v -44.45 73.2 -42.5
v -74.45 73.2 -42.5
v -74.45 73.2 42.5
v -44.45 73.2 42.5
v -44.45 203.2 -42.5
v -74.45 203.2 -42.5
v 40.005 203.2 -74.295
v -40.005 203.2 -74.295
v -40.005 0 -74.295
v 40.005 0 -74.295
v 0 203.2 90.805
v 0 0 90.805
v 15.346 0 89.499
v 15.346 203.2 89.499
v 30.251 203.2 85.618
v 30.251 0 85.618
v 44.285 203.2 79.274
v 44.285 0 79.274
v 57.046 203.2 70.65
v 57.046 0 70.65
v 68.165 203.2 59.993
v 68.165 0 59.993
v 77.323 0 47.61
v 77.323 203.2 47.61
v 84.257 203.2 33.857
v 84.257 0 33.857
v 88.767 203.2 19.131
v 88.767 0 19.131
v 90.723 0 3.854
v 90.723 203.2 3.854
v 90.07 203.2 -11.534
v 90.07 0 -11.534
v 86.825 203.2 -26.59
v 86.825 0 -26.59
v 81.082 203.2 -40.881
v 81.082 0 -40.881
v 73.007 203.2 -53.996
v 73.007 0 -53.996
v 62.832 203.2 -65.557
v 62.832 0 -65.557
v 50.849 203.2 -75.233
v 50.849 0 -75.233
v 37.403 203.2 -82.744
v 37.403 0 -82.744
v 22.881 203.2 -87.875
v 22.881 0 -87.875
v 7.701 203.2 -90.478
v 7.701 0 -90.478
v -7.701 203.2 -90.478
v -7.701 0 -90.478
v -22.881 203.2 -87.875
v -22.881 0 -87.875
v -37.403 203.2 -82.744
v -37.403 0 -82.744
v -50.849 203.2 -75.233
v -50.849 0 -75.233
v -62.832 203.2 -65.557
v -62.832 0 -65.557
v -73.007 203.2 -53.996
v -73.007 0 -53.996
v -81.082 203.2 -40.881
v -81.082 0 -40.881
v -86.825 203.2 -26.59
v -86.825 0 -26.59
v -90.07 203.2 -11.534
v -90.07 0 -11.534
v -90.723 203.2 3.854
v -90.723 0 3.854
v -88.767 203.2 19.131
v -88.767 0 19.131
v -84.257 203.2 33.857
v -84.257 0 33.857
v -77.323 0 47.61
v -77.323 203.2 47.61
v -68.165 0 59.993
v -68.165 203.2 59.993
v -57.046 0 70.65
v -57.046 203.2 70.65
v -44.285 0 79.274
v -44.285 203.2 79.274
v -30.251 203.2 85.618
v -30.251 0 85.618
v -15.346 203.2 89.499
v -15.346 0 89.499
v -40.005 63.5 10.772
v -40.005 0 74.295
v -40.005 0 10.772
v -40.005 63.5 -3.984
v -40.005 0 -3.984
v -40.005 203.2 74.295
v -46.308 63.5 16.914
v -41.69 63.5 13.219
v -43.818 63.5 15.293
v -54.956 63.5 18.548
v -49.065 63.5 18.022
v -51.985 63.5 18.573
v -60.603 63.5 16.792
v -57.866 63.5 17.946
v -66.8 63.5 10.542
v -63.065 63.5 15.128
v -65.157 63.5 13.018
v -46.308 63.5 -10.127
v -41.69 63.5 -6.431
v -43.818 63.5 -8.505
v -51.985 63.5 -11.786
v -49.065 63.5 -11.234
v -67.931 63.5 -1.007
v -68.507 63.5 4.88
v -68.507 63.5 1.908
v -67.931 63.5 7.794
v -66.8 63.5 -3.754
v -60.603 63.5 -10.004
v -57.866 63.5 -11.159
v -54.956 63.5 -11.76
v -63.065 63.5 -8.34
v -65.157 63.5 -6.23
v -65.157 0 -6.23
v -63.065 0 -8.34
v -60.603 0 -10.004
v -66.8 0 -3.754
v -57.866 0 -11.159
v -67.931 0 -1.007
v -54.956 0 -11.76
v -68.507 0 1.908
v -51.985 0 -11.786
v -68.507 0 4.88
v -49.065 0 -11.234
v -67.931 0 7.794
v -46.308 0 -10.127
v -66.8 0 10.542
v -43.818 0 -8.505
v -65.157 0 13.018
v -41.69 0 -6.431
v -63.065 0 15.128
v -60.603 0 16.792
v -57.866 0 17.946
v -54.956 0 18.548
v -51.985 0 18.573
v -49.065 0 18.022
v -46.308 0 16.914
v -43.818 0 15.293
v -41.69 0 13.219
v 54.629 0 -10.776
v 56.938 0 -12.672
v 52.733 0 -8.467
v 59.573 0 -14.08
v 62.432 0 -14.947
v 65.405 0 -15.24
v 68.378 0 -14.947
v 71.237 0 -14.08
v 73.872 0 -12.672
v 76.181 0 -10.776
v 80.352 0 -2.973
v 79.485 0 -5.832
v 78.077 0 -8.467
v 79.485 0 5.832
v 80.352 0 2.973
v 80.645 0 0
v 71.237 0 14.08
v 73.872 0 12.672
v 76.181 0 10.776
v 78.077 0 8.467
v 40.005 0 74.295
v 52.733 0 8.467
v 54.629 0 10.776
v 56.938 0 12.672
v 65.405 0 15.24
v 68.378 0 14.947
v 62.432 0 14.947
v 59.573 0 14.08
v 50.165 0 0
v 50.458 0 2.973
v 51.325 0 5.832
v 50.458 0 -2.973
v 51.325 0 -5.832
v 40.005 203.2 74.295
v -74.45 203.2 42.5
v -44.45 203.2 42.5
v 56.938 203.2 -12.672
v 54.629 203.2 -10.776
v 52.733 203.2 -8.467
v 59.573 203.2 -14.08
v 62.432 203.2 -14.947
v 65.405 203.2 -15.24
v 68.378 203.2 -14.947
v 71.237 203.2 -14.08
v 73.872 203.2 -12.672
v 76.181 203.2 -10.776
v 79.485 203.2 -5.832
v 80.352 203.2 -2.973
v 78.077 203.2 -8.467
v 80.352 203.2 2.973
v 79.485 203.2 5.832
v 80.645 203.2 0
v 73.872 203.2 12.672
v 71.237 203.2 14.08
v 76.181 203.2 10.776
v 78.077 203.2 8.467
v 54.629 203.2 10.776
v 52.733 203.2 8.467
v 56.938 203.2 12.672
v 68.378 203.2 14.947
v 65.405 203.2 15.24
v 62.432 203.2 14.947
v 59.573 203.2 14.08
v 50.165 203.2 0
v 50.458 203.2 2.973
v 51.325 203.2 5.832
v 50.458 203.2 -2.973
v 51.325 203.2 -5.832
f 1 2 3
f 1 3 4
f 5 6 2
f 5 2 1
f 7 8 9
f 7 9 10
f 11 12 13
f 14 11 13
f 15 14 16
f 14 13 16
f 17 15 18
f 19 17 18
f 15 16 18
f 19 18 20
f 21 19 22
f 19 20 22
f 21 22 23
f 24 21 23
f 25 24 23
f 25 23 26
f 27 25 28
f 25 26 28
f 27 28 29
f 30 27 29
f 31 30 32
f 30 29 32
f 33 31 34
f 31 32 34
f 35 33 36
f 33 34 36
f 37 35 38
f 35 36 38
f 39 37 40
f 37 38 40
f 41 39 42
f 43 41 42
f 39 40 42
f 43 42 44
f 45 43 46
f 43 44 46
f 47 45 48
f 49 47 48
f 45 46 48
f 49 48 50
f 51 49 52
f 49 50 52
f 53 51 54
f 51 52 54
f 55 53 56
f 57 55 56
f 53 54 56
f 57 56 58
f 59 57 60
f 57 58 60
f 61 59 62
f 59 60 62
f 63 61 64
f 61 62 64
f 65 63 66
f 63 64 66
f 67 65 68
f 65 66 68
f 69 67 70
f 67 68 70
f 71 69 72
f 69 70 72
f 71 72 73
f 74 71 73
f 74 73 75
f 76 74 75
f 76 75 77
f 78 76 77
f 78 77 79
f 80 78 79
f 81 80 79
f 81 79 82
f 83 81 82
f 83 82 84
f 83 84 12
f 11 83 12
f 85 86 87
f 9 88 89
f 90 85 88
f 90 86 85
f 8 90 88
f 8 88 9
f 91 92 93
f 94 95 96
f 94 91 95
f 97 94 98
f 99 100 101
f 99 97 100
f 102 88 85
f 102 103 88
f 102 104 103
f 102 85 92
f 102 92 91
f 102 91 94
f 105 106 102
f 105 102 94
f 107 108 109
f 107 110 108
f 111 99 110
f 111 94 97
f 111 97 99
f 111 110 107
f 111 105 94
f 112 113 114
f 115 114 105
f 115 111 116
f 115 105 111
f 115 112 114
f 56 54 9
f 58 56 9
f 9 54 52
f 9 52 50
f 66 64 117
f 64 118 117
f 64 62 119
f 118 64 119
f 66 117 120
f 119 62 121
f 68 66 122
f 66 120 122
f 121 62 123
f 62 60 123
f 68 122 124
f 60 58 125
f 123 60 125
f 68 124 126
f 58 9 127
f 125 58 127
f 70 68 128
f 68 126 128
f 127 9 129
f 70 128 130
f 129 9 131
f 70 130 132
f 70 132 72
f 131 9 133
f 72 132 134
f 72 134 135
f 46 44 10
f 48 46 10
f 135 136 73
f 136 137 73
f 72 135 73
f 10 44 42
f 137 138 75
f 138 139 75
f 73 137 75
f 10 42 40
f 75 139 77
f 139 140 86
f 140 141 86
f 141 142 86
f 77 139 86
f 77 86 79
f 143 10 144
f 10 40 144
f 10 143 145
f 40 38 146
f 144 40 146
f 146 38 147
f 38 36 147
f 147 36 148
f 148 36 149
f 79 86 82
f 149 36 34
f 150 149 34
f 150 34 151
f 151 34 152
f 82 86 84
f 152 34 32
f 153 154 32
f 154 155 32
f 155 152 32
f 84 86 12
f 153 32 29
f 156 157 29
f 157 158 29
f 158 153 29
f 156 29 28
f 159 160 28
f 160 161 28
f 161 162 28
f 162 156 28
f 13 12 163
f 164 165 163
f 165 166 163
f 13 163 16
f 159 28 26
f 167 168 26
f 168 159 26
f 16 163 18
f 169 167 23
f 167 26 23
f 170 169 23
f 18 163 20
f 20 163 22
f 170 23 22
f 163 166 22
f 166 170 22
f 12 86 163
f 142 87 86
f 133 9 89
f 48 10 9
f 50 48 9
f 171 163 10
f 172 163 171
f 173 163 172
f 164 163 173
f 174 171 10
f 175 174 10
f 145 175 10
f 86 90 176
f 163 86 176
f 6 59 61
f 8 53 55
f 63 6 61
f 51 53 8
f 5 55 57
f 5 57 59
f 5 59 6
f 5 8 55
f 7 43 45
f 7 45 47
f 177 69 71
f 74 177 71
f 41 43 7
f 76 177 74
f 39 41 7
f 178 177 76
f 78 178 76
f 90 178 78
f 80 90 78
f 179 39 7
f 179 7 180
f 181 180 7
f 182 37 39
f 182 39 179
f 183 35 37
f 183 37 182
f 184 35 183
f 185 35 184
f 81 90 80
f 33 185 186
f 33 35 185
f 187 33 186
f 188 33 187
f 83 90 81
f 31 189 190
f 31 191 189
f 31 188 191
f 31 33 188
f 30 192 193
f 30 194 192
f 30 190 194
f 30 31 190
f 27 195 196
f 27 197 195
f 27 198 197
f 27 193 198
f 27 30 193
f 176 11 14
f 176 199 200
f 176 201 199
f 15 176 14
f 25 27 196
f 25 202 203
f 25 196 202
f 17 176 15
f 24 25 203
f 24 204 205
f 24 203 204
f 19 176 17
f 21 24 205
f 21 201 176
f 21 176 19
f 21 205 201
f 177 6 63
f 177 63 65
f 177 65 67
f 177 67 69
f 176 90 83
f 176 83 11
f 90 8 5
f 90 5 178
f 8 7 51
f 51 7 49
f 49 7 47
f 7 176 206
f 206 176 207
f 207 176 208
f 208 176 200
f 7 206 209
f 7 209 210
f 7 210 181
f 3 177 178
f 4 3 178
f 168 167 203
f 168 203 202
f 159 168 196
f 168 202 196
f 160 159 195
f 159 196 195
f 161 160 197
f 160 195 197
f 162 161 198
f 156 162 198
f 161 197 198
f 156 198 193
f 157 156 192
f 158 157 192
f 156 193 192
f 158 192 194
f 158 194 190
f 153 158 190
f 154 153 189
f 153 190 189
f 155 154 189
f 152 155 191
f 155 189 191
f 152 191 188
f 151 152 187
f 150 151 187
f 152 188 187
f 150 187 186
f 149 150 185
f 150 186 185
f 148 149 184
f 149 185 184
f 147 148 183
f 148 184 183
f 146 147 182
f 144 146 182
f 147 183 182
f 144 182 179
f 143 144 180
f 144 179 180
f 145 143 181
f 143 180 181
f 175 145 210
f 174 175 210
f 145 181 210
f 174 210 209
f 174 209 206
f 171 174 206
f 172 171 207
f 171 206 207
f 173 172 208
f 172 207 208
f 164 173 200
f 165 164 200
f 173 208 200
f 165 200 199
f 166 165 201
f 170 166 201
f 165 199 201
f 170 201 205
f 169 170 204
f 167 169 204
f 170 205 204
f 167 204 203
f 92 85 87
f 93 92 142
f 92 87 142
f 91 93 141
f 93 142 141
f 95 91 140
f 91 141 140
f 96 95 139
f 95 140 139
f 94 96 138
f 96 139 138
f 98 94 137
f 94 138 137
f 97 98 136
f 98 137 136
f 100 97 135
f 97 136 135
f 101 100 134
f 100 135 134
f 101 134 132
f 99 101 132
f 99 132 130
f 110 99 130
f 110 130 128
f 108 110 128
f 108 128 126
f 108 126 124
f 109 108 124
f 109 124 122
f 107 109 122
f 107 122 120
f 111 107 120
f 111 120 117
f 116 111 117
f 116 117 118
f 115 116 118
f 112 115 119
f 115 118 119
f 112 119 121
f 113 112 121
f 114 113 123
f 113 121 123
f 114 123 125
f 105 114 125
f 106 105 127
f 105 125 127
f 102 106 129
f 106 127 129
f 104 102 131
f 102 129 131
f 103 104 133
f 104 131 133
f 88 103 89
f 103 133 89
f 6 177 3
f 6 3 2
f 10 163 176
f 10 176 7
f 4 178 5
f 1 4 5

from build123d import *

# Parameters (mm, degrees)
SKETCH1_R           = 90.805
BOSS_EXTRUDE1_DEPTH = 203.2
SKETCH2_W           = 80.01
SKETCH2_H           = 148.59
CUT_EXTRUDE1_DEPTH  = 203.2
SKETCH3_W           = 30
SKETCH3_H           = 85
CUT_EXTRUDE2_DEPTH  = 130
SKETCH4_R           = 15.24
CUT_EXTRUDE3_DEPTH  = 203.2
SKETCH5_R           = 15.24
CUT_EXTRUDE4_DEPTH  = 63.5


with BuildPart() as part:
    # Sketch1 → Boss-Extrude1 (new body)
    with BuildSketch(Plane(origin=(0, 0, 0), x_dir=(1, 0, 0), z_dir=(0, 1, 0))):
        with Locations(Location((0, 0, 0), (0, 0, 270))):
            Circle(SKETCH1_R)
    extrude(amount=BOSS_EXTRUDE1_DEPTH)

    # Sketch2 → Cut-Extrude1 (cut)
    with BuildSketch(Plane(origin=(0, 203.2, 0), x_dir=(1, 0, 0), z_dir=(0, 1, 0))):
        Rectangle(SKETCH2_W, SKETCH2_H)
    extrude(amount=-CUT_EXTRUDE1_DEPTH, mode=Mode.SUBTRACT)

    # Sketch3 → Cut-Extrude2 (cut)
    with BuildSketch(Plane(origin=(0, 203.2, 0), x_dir=(1, 0, 0), z_dir=(0, 1, 0))):
        with Locations((-59.45, 0)):
            Rectangle(SKETCH3_W, SKETCH3_H)
    extrude(amount=-CUT_EXTRUDE2_DEPTH, mode=Mode.SUBTRACT)

    # Sketch4 → Cut-Extrude3 (cut)
    with BuildSketch(Plane(origin=(0, 203.2, 0), x_dir=(1, 0, 0), z_dir=(0, 1, 0))):
        with Locations(Location((65.405, 0, 0), (0, 0, 270))):
            Circle(SKETCH4_R)
    extrude(amount=-CUT_EXTRUDE3_DEPTH, mode=Mode.SUBTRACT)

    # Sketch5 → Cut-Extrude4 (cut)
    with BuildSketch(Plane(origin=(0, 0, 0), x_dir=(-1, 0, 0), z_dir=(0, -1, 0))):
        with Locations((53.34, -3.393876065)):
            Circle(SKETCH5_R)
    extrude(amount=-CUT_EXTRUDE4_DEPTH, mode=Mode.SUBTRACT)


solid = part.part
